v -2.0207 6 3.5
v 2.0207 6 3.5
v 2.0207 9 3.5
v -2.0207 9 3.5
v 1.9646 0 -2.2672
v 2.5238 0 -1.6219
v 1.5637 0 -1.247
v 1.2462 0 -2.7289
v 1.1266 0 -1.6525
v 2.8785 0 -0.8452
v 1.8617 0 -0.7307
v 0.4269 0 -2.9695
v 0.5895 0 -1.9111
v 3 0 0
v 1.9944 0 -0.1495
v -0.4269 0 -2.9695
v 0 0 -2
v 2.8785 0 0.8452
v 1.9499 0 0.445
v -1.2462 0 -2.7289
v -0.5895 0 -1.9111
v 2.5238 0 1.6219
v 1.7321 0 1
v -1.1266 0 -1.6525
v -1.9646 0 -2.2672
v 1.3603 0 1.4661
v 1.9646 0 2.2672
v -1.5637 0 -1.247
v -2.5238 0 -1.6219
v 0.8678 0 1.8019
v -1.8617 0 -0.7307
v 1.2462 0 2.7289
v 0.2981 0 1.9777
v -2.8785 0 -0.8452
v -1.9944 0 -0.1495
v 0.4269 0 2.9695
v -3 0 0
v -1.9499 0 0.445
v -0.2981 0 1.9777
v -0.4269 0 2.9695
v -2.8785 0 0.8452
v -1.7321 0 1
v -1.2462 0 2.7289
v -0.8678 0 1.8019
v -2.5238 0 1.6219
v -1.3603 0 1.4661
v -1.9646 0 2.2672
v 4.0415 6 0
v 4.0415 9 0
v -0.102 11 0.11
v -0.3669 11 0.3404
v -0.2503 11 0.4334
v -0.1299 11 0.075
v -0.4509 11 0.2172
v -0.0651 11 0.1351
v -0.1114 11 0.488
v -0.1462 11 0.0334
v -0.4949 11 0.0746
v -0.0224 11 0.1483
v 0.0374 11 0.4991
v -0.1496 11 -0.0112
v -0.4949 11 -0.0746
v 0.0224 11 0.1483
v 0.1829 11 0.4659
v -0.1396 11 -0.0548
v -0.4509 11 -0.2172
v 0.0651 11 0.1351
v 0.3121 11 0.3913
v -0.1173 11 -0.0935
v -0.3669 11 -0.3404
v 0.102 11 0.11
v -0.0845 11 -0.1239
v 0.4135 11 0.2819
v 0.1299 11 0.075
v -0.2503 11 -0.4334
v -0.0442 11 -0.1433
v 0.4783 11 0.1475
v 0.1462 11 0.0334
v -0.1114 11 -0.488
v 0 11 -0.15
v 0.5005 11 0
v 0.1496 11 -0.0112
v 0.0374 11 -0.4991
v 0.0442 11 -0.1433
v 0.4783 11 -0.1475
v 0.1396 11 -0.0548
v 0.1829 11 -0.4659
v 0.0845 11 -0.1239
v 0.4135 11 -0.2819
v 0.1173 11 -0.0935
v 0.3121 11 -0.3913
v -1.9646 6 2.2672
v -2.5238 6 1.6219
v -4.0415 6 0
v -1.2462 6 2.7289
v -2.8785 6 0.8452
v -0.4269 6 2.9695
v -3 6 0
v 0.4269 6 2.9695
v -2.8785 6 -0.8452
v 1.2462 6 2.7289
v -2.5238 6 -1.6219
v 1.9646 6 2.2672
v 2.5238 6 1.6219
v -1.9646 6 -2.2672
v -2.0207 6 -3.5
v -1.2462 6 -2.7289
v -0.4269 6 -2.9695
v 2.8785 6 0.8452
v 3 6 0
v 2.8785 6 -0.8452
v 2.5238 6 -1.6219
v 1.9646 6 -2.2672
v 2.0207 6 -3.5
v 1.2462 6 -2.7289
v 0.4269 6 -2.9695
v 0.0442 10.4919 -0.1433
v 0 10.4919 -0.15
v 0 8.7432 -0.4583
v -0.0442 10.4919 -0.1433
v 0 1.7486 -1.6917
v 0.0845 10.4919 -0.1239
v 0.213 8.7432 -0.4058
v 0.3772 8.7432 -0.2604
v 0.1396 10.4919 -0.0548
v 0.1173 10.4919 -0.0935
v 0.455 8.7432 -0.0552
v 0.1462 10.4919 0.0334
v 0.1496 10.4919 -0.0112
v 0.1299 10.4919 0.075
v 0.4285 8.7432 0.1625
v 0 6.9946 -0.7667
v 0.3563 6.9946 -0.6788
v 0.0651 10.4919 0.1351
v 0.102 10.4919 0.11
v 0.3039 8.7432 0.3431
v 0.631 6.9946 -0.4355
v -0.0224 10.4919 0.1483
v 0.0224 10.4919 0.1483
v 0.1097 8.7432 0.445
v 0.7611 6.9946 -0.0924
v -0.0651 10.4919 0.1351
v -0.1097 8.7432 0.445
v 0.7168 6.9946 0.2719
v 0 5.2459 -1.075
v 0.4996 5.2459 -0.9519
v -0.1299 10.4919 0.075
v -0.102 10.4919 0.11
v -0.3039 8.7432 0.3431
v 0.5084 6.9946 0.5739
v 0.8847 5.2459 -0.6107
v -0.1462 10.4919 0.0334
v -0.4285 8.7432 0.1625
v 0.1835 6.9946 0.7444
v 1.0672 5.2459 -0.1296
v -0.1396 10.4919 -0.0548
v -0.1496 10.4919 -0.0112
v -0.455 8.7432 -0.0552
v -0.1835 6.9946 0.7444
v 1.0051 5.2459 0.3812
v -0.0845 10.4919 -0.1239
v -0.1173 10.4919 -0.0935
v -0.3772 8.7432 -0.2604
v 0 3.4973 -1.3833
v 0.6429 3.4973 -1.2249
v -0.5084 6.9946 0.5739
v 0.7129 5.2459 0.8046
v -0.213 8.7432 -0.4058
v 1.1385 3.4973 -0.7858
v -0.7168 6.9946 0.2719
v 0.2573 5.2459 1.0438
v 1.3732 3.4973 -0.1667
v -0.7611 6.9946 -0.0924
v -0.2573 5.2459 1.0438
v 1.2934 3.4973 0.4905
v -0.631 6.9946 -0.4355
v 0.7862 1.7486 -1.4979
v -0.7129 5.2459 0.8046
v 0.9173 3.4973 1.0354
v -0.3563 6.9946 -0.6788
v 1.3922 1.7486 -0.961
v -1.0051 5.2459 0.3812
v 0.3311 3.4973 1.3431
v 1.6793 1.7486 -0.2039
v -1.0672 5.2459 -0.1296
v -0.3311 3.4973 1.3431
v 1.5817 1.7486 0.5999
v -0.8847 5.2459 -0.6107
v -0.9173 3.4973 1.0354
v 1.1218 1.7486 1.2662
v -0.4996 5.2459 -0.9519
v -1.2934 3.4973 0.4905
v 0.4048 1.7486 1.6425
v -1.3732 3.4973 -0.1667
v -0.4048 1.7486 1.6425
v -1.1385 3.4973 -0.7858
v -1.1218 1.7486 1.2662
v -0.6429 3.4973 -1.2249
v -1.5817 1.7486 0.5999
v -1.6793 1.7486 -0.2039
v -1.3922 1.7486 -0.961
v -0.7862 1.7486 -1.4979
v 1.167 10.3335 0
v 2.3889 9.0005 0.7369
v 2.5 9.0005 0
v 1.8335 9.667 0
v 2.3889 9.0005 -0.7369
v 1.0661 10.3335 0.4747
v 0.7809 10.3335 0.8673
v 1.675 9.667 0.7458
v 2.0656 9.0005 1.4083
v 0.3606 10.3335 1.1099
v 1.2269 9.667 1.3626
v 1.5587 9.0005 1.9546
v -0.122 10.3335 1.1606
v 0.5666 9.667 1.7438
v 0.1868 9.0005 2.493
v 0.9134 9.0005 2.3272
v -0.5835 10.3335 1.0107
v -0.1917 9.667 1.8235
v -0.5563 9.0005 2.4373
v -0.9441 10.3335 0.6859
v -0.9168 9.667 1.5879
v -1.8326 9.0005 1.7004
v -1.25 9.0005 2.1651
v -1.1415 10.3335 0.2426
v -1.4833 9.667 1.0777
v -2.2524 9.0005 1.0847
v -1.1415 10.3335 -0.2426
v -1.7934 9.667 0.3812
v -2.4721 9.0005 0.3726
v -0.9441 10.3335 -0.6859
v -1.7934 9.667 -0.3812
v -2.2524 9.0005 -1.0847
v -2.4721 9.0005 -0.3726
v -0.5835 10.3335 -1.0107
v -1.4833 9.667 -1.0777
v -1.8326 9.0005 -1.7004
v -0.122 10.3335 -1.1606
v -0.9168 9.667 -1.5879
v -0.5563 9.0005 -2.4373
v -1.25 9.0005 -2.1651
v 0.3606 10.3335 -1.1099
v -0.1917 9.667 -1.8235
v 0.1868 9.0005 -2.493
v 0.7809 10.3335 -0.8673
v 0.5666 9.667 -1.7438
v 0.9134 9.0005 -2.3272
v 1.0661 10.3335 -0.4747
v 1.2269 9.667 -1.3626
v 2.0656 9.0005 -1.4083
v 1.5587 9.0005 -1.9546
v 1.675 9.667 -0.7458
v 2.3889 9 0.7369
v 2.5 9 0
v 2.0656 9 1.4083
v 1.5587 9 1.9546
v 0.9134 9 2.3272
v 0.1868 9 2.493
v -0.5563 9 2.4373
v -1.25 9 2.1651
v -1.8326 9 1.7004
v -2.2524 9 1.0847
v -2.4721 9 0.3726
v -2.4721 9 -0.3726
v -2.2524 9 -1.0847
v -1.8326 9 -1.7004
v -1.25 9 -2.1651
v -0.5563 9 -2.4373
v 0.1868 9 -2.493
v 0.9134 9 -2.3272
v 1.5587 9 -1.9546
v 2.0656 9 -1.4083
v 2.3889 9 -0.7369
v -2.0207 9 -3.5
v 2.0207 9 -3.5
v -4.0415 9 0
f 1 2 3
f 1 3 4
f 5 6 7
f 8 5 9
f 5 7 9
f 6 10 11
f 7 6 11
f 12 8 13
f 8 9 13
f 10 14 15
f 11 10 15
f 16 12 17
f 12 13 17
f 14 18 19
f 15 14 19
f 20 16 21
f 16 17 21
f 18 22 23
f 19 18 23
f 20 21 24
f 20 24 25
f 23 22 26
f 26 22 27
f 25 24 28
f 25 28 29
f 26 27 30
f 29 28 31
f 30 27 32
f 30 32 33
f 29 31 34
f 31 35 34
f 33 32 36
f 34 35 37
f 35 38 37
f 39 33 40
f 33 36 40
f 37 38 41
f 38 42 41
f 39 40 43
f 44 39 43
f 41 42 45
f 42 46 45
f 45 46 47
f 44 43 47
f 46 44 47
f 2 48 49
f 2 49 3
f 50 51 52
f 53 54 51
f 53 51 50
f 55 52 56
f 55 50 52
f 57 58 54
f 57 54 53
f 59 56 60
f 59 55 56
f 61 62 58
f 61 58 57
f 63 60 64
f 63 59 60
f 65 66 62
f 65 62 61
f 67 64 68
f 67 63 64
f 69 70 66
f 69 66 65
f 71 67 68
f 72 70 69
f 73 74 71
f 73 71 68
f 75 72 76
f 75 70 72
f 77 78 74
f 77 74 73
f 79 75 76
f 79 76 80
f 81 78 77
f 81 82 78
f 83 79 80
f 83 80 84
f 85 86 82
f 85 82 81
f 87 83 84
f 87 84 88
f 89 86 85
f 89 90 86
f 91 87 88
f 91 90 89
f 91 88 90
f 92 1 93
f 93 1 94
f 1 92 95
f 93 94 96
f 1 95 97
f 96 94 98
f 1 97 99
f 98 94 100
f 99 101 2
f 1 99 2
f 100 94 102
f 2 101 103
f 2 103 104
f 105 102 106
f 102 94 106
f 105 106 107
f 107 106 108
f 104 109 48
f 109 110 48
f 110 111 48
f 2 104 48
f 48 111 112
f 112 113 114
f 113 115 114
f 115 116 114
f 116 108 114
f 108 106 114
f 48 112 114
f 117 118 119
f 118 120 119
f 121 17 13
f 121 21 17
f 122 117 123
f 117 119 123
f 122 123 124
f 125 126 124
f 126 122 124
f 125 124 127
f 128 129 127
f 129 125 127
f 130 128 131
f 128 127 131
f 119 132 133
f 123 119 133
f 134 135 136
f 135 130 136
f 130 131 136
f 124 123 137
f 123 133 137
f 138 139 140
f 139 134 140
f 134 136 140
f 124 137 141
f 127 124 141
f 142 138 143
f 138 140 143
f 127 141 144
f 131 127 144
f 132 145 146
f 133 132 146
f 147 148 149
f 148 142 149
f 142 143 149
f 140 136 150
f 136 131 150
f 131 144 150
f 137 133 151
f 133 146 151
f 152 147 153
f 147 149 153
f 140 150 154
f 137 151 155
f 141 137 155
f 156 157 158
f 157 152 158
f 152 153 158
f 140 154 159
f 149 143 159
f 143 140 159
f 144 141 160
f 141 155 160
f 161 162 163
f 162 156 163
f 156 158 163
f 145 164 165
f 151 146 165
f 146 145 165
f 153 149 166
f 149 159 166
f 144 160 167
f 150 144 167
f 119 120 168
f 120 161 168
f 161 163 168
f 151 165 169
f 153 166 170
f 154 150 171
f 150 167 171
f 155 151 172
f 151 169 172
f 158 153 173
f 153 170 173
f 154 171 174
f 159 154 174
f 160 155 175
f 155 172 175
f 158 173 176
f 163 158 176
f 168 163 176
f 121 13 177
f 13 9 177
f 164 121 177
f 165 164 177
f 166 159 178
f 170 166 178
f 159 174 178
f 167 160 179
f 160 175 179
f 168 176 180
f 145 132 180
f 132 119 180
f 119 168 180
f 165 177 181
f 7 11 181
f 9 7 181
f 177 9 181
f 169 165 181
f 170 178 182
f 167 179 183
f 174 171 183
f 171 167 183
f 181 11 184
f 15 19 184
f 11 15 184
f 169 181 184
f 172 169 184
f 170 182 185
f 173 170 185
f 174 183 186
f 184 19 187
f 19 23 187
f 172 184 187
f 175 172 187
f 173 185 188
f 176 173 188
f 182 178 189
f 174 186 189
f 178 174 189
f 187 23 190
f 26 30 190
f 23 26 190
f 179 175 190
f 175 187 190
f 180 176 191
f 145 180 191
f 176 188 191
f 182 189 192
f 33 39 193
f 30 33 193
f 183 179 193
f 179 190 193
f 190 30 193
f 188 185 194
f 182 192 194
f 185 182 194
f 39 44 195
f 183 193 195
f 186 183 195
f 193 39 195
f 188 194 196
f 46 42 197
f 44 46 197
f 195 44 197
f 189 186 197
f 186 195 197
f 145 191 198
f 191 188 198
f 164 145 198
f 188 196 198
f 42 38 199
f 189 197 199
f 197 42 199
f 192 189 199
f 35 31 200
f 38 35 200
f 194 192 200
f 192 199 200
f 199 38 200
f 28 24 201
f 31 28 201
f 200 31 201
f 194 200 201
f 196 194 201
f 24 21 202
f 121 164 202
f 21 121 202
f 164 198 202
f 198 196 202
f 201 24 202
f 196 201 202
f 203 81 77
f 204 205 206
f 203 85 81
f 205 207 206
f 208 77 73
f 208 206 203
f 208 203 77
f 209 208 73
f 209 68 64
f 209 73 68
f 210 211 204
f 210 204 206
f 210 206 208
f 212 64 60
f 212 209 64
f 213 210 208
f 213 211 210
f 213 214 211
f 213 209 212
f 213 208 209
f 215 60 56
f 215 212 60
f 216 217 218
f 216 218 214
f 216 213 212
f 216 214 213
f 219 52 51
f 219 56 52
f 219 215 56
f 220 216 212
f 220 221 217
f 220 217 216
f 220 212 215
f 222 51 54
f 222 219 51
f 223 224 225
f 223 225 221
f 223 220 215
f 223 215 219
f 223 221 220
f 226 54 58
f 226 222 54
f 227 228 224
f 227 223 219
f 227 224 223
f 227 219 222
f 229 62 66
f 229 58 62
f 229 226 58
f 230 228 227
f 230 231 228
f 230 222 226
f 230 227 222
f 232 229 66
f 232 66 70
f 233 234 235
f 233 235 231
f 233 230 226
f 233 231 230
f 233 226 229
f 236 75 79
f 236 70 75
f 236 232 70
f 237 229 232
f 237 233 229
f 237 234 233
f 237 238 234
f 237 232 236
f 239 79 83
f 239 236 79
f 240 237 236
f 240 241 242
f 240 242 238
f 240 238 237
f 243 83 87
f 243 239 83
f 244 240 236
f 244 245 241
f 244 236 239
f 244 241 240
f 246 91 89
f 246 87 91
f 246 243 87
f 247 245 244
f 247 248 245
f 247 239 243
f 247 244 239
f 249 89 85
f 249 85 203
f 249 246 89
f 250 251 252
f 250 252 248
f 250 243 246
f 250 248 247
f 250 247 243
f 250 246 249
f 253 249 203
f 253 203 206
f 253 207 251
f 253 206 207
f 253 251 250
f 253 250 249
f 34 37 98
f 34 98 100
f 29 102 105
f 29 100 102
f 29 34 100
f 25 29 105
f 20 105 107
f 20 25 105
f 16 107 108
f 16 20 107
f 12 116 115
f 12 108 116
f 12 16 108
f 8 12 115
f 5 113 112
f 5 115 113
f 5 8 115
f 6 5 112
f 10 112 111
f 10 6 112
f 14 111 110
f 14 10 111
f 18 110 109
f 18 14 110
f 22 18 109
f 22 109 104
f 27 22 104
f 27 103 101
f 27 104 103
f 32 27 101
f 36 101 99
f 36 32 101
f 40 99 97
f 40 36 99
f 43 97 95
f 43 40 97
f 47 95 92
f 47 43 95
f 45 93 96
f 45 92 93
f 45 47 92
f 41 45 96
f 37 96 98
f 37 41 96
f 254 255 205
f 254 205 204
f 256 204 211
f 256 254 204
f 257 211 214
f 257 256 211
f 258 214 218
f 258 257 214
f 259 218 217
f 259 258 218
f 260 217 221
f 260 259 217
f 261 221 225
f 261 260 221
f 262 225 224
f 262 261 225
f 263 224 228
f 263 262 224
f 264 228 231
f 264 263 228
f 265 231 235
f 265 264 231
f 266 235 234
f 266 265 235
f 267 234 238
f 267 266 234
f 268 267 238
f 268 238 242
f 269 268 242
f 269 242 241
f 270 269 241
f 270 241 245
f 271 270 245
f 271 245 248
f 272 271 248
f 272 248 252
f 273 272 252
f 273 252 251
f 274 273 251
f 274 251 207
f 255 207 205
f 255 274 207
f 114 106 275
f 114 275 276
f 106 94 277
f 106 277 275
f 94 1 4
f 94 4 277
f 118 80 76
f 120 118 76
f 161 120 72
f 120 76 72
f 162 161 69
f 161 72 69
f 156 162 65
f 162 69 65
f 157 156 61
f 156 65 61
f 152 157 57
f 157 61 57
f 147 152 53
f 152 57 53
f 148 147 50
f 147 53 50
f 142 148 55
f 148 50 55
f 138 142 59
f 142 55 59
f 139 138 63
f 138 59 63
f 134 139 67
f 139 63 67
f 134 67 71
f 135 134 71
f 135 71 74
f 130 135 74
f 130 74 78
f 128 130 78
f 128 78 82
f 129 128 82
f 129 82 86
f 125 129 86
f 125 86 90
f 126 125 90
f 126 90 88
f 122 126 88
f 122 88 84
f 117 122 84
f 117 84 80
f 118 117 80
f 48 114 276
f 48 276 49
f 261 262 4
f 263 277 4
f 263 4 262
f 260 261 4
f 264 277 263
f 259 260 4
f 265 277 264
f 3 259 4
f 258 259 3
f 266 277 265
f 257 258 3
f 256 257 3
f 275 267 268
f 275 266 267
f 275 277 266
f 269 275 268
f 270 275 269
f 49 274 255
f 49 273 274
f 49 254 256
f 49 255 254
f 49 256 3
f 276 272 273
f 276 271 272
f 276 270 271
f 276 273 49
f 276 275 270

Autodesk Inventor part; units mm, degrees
ref_plane "YZ Plane" through (0, 0, 0) normal (1, 0, 0) x (0, 1, 0)
ref_plane "XZ Plane" through (0, 0, 0) normal (0, 1, 0) x (-1, 0, 0)
ref_plane "XY Plane" through (0, 0, 0) normal (0, 0, 1) x (1, 0, 0)
sketch "Sketch1" plane through (0, 0, 0) normal (0, 1, 0) x (-1, 0, 0)
  circle A0 centre (0, 0) radius 3
  dimension "d0" = 6
extrude "Extrusion1" add sketch "Sketch1" along normal blind 6
sketch "Sketch2" plane through (0, 6, 0) normal (0, 1, 0) x (1, 0, 0)
  line L0 (-4.0415, 0) -> (-2.0207, 3.5)
  line L1 (-2.0207, 3.5) -> (2.0207, 3.5)
  line L2 (2.0207, 3.5) -> (4.0415, 0)
  line L3 (4.0415, 0) -> (2.0207, -3.5)
  line L4 (2.0207, -3.5) -> (-2.0207, -3.5)
  line L5 (-2.0207, -3.5) -> (-4.0415, 0)
  point P0 (0, 0)
  point P1 (0, 0)
  dimension "d3" = 7
extrude "Extrusion2" add sketch "Sketch2" along normal blind 3
sketch "Sketch3" plane through (0, 9, 0) normal (0, 1, 0) x (1, 0, 0)
  circle A0 centre (0, 0) radius 2.5
  dimension "d6" = 5
extrude "Extrusion3" add sketch "Sketch3" along normal blind 2
chamfer "Chamfer1" distance 2 angle 45 1 edges at (-2.5, 11, 0)
sketch "Sketch4" plane through (0, 0, 0) normal (0, -1, 0) x (1, 0, 0)
  circle A0 centre (0, 0) radius 0.5 projected
hole "Hole1" at (0, 0, 0) direction (0, 1, 0) diameter 0.3 end through all countersink diameter 4 countersink angle 20
thread "Thread1" size "M6x1" class "6g" standard "ANSI Metric M Profile" full length
properties part number "Chimera Nozzle" material "Brass"
